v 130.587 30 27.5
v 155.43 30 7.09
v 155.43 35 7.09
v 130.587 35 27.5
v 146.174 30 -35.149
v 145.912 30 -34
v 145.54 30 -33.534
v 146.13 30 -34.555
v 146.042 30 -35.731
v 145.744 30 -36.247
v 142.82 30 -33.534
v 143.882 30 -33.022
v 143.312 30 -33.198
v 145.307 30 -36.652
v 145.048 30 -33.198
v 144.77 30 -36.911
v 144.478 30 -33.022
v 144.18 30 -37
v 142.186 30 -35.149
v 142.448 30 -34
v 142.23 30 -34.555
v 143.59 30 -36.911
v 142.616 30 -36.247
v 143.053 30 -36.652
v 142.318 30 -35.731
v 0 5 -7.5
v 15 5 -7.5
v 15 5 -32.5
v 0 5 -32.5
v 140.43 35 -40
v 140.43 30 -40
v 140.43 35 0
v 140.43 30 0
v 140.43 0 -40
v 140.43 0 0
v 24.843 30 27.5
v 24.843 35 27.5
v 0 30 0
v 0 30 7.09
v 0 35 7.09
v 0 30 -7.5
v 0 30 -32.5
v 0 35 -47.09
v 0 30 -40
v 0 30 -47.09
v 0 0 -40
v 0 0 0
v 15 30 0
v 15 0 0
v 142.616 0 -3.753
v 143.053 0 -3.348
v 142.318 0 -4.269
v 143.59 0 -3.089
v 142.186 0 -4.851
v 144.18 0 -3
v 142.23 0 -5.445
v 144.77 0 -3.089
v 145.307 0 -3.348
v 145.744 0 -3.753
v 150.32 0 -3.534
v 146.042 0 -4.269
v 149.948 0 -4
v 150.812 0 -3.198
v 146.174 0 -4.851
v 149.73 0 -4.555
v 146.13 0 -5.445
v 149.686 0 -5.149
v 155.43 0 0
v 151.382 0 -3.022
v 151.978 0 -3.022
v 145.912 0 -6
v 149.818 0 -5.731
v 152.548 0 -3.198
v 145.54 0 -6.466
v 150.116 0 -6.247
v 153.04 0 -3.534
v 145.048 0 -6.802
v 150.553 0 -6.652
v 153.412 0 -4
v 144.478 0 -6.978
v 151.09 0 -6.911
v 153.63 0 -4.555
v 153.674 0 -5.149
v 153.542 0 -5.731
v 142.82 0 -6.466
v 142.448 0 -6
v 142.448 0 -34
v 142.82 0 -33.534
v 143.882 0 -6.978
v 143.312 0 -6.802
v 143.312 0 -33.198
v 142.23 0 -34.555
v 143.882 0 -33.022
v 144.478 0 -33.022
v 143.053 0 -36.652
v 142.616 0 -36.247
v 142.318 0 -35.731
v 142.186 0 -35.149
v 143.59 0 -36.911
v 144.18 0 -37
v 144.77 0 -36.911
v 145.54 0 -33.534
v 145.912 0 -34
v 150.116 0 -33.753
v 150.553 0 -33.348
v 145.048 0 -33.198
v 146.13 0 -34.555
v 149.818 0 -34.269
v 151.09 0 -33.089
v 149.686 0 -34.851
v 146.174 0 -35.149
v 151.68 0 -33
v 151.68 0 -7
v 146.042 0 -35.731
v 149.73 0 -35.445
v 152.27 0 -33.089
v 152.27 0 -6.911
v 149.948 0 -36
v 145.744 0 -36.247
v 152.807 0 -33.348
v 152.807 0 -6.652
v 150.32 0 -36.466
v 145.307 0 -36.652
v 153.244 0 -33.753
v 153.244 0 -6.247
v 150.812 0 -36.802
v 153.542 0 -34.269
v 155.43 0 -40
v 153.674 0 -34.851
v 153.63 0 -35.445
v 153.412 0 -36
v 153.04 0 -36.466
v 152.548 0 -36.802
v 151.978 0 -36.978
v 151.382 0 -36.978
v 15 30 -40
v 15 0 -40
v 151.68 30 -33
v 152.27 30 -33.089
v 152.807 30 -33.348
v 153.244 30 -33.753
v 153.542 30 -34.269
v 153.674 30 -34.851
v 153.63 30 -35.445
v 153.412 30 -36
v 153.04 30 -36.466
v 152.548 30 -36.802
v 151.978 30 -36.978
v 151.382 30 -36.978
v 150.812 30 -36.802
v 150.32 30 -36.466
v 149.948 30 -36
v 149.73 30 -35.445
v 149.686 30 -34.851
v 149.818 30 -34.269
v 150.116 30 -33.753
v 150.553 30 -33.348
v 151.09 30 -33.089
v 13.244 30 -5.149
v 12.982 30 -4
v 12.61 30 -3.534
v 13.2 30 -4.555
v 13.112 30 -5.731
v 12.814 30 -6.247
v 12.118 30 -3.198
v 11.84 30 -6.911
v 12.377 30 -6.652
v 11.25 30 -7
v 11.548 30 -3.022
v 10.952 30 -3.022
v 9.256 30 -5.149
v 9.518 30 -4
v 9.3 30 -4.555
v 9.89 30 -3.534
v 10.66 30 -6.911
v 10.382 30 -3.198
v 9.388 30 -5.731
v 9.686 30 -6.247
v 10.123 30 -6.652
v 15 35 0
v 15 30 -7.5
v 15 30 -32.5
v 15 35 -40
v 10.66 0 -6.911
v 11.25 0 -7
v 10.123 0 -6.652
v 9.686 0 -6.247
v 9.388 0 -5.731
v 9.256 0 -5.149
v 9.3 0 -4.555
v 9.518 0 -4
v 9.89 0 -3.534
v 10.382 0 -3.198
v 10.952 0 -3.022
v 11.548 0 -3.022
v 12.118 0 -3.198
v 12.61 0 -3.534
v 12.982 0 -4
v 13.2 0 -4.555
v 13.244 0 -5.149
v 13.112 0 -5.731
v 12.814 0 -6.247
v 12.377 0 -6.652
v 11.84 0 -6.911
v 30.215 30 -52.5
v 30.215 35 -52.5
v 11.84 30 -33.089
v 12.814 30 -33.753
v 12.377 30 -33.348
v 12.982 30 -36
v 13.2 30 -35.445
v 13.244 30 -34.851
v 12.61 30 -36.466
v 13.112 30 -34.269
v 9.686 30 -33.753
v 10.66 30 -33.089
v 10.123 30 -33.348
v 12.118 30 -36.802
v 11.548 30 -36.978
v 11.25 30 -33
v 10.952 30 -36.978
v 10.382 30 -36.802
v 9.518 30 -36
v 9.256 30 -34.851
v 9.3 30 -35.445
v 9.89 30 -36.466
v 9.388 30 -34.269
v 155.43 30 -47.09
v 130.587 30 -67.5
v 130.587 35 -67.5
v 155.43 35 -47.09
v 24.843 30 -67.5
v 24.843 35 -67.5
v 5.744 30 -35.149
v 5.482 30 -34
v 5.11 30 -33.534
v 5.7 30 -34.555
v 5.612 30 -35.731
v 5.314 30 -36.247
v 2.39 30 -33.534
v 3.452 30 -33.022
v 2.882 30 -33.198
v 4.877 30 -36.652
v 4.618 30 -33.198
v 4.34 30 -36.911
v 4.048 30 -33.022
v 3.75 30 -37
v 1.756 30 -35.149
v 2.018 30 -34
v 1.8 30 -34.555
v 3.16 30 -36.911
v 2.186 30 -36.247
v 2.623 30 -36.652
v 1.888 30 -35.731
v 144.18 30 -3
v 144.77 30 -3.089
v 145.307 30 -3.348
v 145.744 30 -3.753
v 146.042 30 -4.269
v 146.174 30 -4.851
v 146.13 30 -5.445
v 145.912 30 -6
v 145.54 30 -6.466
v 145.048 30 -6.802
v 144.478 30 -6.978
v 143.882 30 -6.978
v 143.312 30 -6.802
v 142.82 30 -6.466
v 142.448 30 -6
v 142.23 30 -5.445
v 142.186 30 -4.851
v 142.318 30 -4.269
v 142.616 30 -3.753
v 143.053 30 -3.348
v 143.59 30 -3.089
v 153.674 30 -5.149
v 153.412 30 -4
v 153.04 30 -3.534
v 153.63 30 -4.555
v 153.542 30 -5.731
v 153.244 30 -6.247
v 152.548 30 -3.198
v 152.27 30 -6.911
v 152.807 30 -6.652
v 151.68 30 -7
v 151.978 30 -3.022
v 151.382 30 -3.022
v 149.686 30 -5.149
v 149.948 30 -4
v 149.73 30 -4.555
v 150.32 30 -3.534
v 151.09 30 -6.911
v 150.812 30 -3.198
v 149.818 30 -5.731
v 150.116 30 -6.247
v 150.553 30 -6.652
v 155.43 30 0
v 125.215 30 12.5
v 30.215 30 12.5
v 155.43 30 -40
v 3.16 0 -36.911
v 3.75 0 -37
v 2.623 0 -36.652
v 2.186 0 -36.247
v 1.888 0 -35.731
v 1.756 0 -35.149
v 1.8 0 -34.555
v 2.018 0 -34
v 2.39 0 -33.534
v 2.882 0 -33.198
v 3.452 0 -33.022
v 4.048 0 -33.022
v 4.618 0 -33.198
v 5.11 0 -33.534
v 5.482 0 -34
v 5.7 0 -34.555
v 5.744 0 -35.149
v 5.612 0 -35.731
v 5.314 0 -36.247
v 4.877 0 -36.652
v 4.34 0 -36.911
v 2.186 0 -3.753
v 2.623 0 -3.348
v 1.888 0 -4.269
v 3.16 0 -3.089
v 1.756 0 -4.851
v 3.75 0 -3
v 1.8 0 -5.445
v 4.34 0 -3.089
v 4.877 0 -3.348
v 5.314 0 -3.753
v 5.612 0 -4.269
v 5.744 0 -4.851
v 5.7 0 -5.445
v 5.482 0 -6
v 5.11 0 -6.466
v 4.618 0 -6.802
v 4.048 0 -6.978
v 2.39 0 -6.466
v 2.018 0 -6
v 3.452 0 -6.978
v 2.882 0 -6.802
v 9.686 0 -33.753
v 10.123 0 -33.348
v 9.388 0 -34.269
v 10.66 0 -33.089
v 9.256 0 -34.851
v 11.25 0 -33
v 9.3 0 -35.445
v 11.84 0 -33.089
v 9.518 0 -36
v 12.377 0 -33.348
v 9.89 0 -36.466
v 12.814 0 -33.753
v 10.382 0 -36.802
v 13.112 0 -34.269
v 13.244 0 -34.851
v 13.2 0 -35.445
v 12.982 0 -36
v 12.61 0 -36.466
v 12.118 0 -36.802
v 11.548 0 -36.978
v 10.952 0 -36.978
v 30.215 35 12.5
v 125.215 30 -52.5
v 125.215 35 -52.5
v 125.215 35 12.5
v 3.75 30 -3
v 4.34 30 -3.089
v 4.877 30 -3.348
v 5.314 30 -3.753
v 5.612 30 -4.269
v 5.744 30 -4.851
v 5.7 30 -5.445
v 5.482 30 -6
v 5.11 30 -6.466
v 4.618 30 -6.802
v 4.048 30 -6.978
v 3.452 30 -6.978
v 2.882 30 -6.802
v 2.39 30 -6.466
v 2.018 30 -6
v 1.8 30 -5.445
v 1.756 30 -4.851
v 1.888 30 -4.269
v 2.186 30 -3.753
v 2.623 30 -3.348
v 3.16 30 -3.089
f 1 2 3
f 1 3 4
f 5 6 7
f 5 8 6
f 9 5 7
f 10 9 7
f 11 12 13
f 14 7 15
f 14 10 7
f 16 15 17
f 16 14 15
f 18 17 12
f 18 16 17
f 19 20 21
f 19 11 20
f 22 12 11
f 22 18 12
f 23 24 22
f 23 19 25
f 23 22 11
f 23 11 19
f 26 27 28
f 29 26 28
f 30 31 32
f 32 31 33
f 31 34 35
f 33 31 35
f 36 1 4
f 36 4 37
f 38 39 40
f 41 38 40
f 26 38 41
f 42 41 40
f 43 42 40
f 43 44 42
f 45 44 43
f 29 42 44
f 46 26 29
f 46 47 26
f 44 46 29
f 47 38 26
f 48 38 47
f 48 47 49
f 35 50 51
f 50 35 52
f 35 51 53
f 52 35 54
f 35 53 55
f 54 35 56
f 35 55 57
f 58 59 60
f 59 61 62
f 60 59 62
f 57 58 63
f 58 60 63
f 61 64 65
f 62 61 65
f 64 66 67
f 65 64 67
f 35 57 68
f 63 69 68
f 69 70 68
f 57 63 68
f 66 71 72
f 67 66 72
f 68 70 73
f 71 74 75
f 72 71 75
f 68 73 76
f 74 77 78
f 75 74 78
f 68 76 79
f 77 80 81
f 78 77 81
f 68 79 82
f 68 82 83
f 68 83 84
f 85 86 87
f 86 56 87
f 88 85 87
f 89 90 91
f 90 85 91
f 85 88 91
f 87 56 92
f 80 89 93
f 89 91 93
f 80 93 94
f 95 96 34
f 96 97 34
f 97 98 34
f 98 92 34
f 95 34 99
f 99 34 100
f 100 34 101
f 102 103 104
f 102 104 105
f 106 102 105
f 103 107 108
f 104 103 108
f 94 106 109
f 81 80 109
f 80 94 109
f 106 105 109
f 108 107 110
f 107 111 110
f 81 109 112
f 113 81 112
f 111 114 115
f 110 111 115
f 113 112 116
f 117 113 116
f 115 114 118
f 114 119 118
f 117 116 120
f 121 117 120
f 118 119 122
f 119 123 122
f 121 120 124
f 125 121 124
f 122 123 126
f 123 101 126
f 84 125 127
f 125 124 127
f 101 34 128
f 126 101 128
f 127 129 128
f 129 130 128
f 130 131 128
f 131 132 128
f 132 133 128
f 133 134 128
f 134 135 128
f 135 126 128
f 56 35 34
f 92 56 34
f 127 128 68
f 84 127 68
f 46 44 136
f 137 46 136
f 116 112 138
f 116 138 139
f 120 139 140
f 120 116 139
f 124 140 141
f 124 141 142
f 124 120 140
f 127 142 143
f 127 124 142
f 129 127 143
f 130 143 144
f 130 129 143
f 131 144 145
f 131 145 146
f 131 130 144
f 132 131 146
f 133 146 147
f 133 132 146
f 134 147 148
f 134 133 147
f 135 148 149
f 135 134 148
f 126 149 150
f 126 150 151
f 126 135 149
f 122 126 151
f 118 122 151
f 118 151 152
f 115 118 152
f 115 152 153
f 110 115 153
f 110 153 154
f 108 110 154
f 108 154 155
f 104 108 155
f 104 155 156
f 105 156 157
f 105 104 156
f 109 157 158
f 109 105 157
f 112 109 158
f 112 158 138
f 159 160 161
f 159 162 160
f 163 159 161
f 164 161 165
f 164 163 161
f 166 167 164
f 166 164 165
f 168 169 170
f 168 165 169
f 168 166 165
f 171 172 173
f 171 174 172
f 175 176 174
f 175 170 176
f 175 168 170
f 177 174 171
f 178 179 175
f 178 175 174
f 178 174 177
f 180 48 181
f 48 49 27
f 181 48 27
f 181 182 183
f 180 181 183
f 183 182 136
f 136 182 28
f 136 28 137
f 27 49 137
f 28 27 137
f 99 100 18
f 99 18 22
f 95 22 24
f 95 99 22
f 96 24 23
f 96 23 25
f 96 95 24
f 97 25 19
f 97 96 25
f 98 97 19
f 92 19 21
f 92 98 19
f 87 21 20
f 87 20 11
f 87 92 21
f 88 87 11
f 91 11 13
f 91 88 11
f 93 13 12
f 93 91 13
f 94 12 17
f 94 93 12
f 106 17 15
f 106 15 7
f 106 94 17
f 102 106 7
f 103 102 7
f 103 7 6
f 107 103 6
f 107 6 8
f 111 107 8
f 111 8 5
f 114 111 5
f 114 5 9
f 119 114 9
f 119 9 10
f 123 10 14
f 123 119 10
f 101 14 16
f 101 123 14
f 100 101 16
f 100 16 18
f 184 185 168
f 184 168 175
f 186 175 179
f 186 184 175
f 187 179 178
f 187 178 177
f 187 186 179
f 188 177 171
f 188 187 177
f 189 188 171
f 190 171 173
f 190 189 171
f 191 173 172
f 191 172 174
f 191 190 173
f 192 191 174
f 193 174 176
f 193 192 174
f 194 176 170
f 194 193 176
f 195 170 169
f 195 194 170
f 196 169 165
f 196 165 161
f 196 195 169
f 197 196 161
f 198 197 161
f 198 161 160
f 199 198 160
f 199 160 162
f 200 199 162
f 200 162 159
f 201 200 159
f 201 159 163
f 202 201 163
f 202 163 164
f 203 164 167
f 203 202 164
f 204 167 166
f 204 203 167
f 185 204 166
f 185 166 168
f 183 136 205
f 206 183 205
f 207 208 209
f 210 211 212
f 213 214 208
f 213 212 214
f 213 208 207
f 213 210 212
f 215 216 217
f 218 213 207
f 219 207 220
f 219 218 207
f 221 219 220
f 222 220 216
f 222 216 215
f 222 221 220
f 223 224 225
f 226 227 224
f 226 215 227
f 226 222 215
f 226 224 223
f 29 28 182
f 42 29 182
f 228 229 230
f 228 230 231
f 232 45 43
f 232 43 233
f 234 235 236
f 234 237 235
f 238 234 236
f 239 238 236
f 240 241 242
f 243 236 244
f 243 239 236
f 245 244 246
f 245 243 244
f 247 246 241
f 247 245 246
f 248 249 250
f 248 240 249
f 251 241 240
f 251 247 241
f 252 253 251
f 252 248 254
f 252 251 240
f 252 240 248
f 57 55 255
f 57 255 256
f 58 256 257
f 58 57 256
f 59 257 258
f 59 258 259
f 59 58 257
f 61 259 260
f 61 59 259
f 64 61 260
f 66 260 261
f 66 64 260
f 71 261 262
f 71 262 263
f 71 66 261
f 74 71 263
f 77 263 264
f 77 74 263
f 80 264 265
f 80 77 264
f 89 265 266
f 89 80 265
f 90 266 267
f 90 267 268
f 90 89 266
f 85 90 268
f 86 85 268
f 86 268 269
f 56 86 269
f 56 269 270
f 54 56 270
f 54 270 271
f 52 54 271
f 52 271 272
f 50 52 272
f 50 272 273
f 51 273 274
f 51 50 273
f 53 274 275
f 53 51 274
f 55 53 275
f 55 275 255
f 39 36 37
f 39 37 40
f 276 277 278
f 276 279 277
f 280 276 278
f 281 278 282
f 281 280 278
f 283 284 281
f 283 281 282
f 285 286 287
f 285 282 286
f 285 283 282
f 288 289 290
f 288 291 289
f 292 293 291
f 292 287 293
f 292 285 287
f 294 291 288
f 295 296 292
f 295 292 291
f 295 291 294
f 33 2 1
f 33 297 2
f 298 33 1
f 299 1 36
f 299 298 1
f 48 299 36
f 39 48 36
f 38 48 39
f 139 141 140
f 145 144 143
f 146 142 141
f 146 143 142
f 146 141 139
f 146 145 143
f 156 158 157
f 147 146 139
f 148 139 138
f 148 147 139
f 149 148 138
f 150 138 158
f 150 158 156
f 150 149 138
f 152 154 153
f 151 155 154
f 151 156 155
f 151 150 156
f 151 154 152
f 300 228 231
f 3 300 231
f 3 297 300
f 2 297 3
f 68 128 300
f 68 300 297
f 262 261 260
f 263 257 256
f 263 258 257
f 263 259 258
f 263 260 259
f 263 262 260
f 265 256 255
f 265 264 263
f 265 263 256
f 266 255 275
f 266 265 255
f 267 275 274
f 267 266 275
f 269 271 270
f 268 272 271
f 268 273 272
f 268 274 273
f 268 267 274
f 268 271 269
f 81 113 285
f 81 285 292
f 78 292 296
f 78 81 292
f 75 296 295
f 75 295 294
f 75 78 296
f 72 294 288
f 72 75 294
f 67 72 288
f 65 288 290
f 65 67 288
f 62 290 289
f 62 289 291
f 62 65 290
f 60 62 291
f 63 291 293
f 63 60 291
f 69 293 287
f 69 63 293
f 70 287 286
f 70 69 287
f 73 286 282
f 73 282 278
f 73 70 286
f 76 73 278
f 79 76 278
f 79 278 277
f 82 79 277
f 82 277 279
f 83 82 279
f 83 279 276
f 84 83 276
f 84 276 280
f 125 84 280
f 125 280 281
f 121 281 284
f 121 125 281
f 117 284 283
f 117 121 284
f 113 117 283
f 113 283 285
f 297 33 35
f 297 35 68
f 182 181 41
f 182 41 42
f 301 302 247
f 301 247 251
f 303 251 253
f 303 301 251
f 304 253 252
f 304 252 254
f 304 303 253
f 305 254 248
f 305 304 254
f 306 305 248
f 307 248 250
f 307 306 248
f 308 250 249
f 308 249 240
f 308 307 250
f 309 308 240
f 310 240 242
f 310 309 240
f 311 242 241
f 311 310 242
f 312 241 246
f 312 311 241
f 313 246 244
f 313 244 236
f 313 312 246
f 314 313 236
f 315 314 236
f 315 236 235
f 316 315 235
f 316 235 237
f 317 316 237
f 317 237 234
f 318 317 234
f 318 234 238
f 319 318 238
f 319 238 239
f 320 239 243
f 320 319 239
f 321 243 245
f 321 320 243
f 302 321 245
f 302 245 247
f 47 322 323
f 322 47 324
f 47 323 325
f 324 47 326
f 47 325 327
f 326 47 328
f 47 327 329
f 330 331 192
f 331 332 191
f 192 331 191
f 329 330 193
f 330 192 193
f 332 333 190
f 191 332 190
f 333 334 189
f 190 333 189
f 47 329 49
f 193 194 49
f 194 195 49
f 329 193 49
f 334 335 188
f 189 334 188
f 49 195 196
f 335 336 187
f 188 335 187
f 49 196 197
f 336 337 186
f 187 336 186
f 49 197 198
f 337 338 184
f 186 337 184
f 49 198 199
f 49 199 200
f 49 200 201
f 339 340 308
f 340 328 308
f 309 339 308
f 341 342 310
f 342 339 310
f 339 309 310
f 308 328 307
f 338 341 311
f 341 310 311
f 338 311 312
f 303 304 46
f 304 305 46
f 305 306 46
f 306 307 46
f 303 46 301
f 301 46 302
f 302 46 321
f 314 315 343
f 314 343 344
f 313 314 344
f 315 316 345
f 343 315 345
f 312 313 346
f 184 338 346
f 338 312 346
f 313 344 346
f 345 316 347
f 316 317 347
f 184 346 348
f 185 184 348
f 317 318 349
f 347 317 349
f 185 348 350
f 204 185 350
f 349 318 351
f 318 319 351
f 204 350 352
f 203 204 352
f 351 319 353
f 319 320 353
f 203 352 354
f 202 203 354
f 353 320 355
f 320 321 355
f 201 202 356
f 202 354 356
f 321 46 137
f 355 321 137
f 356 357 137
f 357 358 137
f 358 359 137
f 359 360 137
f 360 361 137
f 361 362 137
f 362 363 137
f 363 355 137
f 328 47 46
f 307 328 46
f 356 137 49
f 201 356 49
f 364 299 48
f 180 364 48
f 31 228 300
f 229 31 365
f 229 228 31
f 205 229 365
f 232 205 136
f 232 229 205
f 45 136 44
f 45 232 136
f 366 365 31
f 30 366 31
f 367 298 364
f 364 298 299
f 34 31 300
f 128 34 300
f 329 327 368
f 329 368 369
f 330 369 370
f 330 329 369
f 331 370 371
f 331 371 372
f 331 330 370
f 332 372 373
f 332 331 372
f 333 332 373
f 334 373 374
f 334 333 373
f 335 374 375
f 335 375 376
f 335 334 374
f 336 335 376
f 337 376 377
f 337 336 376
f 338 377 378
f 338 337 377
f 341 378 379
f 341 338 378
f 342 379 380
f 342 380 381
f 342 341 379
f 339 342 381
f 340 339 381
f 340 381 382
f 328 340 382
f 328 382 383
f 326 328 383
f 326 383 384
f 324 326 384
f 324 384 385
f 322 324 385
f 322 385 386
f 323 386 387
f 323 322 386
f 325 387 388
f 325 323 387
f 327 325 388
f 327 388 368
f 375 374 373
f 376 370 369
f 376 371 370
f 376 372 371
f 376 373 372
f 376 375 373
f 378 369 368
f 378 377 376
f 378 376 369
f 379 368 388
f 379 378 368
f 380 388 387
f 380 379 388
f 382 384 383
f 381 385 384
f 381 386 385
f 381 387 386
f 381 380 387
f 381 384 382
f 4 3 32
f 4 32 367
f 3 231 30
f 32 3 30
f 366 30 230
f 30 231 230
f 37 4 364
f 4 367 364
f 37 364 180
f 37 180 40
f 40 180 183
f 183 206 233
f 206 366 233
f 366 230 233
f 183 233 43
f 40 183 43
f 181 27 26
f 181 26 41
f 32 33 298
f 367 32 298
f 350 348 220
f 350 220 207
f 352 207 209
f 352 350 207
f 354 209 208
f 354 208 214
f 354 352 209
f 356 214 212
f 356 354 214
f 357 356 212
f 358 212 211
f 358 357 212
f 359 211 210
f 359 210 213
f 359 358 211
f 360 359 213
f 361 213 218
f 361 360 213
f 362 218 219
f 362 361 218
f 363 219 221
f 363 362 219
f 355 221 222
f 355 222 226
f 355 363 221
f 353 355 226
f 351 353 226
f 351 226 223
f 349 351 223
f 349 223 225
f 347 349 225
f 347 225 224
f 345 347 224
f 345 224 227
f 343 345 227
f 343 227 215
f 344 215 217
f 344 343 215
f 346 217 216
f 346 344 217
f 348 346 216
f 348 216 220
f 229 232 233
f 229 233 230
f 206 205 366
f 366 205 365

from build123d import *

# Parameters (mm, degrees)
SKETCH1_W             = 15
SKETCH1_H             = 40
SKETCH1_R             = 2
BOSS_EXTRUDE1_DEPTH   = 30
BOSS_EXTRUDE1_2_DEPTH = 30
BOSS_EXTRUDE2_DEPTH   = 5
SKETCH3_W             = 25
SKETCH3_H             = 25
CUT_EXTRUDE1_DEPTH    = 25


with BuildPart() as part:
    # Sketch1 → Boss-Extrude1 (new body)
    with BuildSketch(Plane(origin=(0, 0, 0), x_dir=(1, 0, 0), z_dir=(0, 1, 0))):
        with Locations((7.5, 20)):
            Rectangle(SKETCH1_W, SKETCH1_H)
        with Locations(Location((3.75, 35, 0), (0, 0, 90))):
            Circle(SKETCH1_R, mode=Mode.SUBTRACT)
        with Locations(Location((11.25, 35, 0), (0, 0, 270))):
            Circle(SKETCH1_R, mode=Mode.SUBTRACT)
        with Locations(Location((11.25, 5, 0), (0, 0, 90))):
            Circle(SKETCH1_R, mode=Mode.SUBTRACT)
        with Locations(Location((3.75, 5, 0), (0, 0, 270))):
            Circle(SKETCH1_R, mode=Mode.SUBTRACT)
    extrude(amount=BOSS_EXTRUDE1_DEPTH)



with BuildPart() as body_2:
    # Sketch1 → Boss-Extrude1 2 (new body)
    with BuildSketch(Plane(origin=(0, 0, 0), x_dir=(1, 0, 0), z_dir=(0, 1, 0))):
        with Locations((147.93, 20)):
            Rectangle(SKETCH1_W, SKETCH1_H)
        with Locations(Location((144.18, 5, 0), (0, 0, 270))):
            Circle(SKETCH1_R, mode=Mode.SUBTRACT)
        with Locations(Location((151.68, 5, 0), (0, 0, 90))):
            Circle(SKETCH1_R, mode=Mode.SUBTRACT)
        with Locations(Location((151.68, 35, 0), (0, 0, 270))):
            Circle(SKETCH1_R, mode=Mode.SUBTRACT)
        with Locations(Location((144.18, 35, 0), (0, 0, 90))):
            Circle(SKETCH1_R, mode=Mode.SUBTRACT)
    extrude(amount=BOSS_EXTRUDE1_2_DEPTH)


with BuildPart() as part_1:
    add(part.part)

    add(body_2.part)  # Boss-Extrude2 merges body 2
    # Sketch2 → Boss-Extrude2 (add)
    with BuildSketch(Plane(origin=(0, 30, 0), x_dir=(1, 0, 0), z_dir=(0, 1, 0))):
        Polygon((130.586527376, -27.5), (24.843472624, -27.5), (0, -7.089654433), (0, 47.089654433), (24.843472624, 67.5), (130.586527376, 67.5), (155.43, 47.089654433), (155.43, -7.089654433), align=None)
        Polygon((15, 40), (30.215, 52.5), (125.215, 52.5), (140.43, 40), (140.43, 0), (125.215, -12.5), (30.215, -12.5), (15, 0), align=None, mode=Mode.SUBTRACT)
    extrude(amount=BOSS_EXTRUDE2_DEPTH)

    # Sketch3 → Cut-Extrude1 (cut)
    with BuildSketch(Plane(origin=(15, 0, 0), x_dir=(0, 0, -1), z_dir=(1, 0, 0))):
        with Locations((20, 17.5)):
            Rectangle(SKETCH3_W, SKETCH3_H)
    extrude(amount=-CUT_EXTRUDE1_DEPTH, mode=Mode.SUBTRACT)


solid = part_1.part
